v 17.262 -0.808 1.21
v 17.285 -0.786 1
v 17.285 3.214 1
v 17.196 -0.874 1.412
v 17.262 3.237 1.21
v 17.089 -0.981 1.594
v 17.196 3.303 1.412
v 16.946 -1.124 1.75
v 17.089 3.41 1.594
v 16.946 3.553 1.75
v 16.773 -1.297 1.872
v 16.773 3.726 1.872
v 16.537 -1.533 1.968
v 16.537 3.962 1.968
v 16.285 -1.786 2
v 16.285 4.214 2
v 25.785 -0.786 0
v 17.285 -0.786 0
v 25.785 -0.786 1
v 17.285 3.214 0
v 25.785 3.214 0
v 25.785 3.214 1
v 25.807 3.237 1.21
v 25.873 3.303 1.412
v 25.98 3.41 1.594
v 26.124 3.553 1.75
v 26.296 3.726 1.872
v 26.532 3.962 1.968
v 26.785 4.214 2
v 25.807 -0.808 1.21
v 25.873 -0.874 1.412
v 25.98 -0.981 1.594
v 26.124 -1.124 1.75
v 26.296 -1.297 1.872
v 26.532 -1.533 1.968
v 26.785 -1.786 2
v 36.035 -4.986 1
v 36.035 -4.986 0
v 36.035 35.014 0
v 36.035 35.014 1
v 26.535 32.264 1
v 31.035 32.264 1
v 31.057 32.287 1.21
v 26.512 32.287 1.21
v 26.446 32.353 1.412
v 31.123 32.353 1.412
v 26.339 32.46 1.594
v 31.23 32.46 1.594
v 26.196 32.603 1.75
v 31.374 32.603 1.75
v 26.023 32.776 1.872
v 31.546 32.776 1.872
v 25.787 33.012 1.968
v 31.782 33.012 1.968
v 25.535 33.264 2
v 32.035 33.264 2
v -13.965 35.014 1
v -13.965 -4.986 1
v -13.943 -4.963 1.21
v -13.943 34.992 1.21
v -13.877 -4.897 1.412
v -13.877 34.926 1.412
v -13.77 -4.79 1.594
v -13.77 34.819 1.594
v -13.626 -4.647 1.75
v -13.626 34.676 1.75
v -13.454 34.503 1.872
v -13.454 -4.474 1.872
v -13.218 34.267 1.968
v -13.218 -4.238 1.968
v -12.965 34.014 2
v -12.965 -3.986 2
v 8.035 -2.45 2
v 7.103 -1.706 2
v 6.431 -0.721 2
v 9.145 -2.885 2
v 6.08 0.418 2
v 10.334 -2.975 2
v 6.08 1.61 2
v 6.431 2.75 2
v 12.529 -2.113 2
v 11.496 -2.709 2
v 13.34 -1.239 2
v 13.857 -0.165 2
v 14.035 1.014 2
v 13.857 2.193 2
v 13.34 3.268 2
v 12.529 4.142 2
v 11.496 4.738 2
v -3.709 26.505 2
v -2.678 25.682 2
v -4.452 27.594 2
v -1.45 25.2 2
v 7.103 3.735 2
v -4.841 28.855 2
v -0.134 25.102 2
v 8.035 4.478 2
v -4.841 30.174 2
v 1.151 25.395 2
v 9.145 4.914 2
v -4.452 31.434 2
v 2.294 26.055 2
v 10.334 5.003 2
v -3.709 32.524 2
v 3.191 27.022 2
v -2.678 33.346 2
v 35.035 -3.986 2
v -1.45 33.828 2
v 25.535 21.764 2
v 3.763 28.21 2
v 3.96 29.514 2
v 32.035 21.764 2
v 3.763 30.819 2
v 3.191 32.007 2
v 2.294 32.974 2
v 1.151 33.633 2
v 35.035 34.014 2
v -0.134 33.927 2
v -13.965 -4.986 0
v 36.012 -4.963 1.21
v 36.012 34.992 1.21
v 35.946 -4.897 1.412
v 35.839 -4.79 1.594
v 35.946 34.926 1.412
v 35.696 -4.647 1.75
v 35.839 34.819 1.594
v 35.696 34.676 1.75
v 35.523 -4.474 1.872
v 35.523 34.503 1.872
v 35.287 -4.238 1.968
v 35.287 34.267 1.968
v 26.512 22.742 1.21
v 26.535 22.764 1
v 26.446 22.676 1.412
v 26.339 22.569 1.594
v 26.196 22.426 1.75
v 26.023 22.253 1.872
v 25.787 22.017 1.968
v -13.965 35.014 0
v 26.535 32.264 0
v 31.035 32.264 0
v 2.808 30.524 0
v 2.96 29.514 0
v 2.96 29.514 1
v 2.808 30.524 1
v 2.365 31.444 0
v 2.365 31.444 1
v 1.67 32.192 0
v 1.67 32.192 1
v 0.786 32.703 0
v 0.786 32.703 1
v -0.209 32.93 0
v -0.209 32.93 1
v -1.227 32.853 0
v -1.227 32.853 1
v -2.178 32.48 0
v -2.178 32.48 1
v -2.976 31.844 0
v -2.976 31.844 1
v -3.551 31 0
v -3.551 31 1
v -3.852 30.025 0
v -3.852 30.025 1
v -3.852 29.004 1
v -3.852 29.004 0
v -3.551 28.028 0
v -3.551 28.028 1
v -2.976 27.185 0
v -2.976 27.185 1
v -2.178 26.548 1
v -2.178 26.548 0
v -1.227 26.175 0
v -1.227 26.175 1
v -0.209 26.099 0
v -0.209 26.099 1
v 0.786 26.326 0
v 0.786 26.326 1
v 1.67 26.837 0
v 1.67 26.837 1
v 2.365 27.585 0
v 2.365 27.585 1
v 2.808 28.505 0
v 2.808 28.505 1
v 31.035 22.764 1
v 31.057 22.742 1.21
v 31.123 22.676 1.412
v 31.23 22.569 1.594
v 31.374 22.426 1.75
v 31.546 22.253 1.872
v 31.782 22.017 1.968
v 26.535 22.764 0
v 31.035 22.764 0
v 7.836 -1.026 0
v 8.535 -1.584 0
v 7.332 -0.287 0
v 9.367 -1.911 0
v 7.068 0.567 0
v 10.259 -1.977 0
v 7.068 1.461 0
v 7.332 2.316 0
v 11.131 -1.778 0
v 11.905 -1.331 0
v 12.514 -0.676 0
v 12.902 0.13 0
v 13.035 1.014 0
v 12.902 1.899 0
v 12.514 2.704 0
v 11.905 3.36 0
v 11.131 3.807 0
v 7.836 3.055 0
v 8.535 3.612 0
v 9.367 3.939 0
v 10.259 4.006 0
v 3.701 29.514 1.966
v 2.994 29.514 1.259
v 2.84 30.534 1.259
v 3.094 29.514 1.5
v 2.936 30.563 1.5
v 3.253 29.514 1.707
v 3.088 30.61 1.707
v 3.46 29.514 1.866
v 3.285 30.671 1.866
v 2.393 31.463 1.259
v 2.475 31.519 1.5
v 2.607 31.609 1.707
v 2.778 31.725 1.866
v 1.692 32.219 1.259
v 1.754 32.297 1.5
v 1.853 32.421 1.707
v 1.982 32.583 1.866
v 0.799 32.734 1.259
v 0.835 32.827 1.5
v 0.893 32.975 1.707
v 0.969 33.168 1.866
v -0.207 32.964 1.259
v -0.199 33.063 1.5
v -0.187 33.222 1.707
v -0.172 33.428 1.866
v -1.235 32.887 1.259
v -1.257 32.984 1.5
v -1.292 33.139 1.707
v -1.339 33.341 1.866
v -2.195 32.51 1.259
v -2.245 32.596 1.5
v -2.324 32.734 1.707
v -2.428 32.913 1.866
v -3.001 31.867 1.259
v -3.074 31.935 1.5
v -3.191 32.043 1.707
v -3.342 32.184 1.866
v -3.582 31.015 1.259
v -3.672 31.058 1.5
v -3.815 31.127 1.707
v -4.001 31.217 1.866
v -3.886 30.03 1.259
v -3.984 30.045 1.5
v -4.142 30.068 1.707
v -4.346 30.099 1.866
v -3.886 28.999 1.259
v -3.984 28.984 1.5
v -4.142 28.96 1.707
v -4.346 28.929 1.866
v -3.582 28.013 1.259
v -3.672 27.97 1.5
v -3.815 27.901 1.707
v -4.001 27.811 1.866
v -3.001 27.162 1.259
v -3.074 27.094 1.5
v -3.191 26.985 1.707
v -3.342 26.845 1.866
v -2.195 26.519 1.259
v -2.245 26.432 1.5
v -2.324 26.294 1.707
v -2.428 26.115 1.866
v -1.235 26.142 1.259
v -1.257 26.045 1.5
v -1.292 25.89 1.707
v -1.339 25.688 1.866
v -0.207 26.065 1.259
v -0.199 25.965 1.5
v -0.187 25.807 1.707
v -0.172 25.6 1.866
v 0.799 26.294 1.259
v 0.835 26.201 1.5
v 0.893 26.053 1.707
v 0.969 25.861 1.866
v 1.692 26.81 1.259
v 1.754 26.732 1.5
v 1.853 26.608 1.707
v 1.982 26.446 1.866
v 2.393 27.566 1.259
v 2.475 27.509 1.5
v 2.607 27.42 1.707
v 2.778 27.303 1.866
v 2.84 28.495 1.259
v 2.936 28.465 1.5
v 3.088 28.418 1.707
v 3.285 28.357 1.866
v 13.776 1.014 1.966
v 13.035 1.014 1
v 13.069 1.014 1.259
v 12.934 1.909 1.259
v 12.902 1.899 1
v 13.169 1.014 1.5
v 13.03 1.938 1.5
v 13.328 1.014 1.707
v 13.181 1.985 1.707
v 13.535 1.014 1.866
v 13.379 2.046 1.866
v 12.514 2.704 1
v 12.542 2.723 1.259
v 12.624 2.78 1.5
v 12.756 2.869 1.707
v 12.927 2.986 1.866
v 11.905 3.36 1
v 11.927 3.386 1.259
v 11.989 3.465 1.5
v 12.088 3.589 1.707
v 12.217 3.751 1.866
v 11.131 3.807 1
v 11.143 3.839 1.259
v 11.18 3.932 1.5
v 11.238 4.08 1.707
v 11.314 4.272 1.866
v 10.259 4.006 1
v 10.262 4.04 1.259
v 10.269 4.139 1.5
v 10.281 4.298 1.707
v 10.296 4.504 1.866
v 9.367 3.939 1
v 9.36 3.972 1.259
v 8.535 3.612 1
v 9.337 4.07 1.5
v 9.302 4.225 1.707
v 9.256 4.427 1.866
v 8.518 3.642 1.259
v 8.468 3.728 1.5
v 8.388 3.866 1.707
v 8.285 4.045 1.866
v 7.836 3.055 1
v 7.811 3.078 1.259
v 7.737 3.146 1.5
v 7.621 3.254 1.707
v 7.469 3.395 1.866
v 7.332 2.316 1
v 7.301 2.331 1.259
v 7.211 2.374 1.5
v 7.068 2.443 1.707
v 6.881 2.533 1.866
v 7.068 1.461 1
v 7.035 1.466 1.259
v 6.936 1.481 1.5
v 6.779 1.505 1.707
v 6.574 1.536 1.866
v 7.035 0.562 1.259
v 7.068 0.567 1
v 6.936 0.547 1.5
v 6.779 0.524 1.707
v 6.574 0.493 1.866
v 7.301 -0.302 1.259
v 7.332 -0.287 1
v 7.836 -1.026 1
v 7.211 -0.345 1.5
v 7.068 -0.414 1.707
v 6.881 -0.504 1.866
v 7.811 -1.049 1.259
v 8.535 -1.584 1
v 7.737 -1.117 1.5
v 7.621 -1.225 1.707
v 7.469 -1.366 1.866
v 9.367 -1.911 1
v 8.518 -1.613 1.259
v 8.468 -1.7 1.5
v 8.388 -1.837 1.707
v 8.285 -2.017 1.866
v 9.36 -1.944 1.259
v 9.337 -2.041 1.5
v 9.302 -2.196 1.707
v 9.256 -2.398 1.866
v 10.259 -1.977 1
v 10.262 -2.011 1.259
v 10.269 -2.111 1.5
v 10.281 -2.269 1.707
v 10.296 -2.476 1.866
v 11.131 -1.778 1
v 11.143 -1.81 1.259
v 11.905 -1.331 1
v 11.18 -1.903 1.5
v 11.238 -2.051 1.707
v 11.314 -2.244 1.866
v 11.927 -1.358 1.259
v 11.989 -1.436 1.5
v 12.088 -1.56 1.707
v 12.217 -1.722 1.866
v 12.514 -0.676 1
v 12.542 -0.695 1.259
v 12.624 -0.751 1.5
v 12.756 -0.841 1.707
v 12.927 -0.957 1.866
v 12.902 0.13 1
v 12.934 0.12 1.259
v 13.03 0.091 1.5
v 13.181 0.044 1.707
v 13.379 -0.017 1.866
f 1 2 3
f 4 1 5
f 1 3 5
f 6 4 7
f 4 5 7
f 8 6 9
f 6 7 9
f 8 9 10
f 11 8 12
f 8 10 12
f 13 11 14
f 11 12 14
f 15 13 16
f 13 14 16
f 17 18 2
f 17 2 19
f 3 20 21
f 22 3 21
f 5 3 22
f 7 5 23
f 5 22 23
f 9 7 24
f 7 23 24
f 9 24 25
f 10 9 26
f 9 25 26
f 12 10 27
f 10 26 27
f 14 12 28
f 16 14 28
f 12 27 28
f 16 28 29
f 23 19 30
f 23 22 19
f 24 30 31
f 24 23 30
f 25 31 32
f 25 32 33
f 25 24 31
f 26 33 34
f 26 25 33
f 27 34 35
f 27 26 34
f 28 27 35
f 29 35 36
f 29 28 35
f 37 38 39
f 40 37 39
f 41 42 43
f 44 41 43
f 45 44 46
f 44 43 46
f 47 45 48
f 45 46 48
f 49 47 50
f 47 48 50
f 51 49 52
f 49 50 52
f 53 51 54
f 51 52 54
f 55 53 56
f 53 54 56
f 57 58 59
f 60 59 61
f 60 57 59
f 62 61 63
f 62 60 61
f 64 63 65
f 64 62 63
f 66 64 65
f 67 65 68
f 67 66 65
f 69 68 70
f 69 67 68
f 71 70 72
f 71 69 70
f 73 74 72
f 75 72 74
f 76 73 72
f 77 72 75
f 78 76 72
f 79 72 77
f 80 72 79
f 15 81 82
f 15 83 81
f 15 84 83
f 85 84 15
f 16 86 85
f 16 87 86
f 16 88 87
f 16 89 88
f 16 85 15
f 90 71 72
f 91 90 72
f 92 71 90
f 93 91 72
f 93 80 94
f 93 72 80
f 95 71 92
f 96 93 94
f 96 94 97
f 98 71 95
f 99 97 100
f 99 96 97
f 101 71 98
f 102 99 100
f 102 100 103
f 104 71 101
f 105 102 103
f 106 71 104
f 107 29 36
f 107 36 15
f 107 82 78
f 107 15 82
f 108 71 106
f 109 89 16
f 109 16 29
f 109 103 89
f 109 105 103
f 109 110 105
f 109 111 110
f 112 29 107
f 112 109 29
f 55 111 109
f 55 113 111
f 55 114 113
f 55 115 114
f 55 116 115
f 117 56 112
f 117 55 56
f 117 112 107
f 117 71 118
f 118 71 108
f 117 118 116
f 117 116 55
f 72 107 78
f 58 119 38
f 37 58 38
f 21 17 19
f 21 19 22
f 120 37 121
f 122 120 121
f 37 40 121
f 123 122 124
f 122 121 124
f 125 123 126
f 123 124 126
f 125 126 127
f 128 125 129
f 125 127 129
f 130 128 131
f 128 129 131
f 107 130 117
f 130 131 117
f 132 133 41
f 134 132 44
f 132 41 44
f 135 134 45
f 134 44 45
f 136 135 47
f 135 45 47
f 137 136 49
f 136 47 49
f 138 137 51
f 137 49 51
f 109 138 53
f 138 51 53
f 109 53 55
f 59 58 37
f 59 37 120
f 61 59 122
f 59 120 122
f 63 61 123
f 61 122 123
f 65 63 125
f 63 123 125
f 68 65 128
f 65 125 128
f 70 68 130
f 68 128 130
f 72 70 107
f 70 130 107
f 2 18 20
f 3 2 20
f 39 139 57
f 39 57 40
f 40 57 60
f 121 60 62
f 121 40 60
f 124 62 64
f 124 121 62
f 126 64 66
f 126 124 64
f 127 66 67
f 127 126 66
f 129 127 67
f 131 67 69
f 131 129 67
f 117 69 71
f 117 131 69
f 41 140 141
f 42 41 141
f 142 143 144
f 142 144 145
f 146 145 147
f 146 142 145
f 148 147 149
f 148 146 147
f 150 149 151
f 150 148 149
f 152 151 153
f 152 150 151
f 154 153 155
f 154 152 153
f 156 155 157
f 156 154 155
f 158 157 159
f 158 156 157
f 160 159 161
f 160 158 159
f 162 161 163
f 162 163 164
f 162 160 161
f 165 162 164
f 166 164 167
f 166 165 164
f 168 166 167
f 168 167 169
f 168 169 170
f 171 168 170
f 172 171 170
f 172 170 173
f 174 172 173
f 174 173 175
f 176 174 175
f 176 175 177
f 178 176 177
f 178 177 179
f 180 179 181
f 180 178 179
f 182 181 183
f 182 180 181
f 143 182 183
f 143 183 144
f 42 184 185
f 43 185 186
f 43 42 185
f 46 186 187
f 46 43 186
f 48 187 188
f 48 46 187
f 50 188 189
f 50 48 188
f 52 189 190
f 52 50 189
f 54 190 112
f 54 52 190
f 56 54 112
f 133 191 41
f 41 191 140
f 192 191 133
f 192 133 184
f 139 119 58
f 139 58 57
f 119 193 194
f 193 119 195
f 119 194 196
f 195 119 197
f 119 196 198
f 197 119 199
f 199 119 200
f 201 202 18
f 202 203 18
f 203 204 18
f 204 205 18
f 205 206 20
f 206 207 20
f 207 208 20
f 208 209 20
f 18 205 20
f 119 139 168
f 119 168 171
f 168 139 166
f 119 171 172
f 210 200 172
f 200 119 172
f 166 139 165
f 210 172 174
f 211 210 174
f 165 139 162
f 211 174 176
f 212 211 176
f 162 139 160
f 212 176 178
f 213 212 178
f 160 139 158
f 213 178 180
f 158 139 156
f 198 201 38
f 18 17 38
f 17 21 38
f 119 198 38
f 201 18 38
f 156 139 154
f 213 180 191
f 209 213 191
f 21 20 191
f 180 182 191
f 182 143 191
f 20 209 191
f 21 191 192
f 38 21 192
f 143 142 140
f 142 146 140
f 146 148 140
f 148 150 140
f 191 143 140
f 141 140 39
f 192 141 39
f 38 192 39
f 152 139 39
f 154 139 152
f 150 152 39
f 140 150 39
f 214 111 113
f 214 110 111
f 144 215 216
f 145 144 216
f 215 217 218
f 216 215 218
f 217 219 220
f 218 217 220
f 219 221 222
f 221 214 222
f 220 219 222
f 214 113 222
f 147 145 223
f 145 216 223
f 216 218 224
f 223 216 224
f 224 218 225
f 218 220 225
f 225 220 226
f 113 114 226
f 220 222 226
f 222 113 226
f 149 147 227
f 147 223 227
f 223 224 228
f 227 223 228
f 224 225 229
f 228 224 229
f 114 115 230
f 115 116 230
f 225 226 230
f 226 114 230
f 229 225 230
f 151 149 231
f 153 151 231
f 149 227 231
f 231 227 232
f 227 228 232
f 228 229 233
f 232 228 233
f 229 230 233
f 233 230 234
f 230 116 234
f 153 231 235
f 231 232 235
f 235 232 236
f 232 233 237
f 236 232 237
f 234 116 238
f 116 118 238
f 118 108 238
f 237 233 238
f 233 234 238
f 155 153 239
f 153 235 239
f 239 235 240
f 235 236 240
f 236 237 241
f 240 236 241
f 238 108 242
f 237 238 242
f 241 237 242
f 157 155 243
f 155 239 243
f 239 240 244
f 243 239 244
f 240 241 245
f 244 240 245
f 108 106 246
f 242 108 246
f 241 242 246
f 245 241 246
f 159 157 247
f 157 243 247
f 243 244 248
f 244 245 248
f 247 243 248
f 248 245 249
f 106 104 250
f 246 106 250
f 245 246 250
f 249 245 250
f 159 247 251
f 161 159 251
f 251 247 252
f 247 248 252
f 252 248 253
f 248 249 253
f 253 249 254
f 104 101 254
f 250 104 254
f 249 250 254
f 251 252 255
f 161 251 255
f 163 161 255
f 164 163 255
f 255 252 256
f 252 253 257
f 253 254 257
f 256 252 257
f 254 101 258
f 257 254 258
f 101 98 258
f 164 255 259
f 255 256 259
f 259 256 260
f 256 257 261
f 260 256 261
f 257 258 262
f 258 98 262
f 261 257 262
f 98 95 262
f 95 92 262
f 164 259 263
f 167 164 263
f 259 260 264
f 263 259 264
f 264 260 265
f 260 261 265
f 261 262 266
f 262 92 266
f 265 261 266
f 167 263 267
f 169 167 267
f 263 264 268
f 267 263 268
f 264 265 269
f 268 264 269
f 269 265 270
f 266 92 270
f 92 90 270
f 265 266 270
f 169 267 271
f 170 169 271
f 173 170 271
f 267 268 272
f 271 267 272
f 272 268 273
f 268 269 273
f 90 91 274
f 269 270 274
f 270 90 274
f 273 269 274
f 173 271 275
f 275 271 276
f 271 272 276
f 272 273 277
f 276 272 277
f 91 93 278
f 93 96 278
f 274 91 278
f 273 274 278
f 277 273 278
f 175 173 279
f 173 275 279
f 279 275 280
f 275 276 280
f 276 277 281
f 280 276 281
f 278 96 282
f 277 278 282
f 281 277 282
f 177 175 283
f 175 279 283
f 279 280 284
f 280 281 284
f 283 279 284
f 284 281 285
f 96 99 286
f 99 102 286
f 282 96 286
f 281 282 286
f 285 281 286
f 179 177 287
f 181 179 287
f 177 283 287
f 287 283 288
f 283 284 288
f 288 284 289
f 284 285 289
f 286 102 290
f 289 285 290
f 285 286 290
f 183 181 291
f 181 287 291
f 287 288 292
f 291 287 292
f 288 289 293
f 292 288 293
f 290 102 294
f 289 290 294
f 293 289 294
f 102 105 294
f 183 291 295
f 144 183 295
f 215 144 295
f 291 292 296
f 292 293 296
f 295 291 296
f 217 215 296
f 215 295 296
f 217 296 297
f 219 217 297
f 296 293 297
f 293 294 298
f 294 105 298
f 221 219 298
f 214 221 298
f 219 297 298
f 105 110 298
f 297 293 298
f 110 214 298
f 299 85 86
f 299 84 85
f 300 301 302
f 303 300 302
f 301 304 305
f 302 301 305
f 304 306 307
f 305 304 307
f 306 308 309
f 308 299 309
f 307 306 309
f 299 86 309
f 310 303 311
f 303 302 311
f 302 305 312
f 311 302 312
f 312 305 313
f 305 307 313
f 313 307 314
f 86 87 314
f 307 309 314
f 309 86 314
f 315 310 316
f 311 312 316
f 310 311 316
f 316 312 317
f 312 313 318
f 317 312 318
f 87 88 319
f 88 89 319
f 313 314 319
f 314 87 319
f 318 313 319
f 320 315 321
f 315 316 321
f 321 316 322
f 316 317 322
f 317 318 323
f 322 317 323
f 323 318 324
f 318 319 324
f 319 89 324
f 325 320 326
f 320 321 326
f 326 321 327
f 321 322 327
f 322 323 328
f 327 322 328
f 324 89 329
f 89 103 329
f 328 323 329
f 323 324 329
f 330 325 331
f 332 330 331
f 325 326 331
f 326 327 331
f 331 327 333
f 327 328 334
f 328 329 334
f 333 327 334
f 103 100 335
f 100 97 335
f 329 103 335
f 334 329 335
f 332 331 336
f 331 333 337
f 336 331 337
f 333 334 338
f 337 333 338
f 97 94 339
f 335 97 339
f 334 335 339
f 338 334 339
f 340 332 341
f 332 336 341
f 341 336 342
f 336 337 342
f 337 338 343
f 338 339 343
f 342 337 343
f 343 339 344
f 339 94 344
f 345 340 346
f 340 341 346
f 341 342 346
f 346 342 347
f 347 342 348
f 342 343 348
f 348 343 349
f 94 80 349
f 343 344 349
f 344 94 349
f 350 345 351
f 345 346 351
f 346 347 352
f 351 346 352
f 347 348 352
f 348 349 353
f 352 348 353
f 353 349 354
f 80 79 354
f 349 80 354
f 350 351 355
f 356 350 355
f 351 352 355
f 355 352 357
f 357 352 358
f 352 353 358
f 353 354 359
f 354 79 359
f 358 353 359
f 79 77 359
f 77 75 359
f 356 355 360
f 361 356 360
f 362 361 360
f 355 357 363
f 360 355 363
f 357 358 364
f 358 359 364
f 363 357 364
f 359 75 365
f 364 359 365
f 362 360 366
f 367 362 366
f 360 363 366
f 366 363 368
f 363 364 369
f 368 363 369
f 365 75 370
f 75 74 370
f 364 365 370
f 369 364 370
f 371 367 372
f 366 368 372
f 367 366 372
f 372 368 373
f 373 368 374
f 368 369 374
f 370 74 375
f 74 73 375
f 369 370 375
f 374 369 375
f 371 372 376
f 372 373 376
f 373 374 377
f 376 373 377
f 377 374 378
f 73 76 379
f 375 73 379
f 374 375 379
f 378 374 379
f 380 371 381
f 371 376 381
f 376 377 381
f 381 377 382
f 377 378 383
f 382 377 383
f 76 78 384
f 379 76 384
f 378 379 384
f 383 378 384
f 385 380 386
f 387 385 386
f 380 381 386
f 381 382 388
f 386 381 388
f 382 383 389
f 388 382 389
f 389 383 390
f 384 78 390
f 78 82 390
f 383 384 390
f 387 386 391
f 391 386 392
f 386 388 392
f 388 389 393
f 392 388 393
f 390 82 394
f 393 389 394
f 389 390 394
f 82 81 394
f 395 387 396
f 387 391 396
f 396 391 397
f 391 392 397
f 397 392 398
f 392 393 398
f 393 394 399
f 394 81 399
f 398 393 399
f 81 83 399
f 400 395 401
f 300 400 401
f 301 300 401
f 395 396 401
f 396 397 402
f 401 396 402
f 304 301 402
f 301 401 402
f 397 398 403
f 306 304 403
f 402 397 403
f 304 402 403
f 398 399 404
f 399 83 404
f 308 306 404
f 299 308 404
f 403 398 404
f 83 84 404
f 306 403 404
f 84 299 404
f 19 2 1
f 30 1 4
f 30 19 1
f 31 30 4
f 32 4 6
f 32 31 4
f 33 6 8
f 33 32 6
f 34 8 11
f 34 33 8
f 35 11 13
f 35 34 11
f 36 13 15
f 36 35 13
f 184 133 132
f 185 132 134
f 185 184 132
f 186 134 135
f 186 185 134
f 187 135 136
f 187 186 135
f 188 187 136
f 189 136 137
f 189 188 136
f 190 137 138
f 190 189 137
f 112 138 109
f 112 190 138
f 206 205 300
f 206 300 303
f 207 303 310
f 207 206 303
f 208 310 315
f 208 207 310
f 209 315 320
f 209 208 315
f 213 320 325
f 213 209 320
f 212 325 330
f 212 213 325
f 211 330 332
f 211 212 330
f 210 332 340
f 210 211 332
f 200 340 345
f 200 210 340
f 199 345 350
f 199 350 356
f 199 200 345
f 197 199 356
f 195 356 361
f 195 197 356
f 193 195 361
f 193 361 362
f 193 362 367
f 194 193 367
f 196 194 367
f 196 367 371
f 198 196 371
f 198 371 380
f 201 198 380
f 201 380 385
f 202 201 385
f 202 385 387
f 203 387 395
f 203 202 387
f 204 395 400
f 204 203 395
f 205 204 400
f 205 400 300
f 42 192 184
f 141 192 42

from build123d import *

# Parameters (mm, degrees)
F0_W     = 50
F0_H     = 40
F0_R     = 3
F0_W_2   = 8.5
F0_H_2   = 4
F0_R_2   = 3.425
F0_W_3   = 4.5
F0_H_3   = 9.5
F1_DEPTH = 2
F2_R     = 1


with BuildPart() as f1:
    # F0 (on Top) → F1 (new body)
    with BuildSketch(Plane.XY):
        with Locations((11.034863, 15.014281)):
            Rectangle(F0_W, F0_H)
        with Locations((10.034863, 1.014281)):
            Circle(F0_R, mode=Mode.SUBTRACT)
        with Locations((21.534863, 1.214281)):
            Rectangle(F0_W_2, F0_H_2, mode=Mode.SUBTRACT)
        with Locations((-0.465137, 29.514281)):
            Circle(F0_R_2, mode=Mode.SUBTRACT)
        with Locations((28.784863, 27.514281)):
            Rectangle(F0_W_3, F0_H_3, mode=Mode.SUBTRACT)
    extrude(amount=F1_DEPTH)

    # F2
    f2_edges = [f1.edges().sort_by_distance(p)[0] for p in [
        (31.034863, 27.514281, 2),
        (28.784863, 22.764281, 2),
        (26.534863, 27.514281, 2),
        (28.784863, 32.264281, 2),
        (17.284863, 1.214281, 2),
        (21.534863, -0.785719, 2),
        (25.784863, 1.214281, 2),
        (21.534863, 3.214281, 2),
        (7.034863, 1.014281, 2),
        (-3.890137, 29.514281, 2),
        (11.034863, 35.014281, 2),
        (-13.965137, 15.014281, 2),
        (36.034863, 15.014281, 2),
        (11.034863, -4.985719, 2),
    ]]
    fillet(f2_edges, radius=F2_R)


solid = f1.part
